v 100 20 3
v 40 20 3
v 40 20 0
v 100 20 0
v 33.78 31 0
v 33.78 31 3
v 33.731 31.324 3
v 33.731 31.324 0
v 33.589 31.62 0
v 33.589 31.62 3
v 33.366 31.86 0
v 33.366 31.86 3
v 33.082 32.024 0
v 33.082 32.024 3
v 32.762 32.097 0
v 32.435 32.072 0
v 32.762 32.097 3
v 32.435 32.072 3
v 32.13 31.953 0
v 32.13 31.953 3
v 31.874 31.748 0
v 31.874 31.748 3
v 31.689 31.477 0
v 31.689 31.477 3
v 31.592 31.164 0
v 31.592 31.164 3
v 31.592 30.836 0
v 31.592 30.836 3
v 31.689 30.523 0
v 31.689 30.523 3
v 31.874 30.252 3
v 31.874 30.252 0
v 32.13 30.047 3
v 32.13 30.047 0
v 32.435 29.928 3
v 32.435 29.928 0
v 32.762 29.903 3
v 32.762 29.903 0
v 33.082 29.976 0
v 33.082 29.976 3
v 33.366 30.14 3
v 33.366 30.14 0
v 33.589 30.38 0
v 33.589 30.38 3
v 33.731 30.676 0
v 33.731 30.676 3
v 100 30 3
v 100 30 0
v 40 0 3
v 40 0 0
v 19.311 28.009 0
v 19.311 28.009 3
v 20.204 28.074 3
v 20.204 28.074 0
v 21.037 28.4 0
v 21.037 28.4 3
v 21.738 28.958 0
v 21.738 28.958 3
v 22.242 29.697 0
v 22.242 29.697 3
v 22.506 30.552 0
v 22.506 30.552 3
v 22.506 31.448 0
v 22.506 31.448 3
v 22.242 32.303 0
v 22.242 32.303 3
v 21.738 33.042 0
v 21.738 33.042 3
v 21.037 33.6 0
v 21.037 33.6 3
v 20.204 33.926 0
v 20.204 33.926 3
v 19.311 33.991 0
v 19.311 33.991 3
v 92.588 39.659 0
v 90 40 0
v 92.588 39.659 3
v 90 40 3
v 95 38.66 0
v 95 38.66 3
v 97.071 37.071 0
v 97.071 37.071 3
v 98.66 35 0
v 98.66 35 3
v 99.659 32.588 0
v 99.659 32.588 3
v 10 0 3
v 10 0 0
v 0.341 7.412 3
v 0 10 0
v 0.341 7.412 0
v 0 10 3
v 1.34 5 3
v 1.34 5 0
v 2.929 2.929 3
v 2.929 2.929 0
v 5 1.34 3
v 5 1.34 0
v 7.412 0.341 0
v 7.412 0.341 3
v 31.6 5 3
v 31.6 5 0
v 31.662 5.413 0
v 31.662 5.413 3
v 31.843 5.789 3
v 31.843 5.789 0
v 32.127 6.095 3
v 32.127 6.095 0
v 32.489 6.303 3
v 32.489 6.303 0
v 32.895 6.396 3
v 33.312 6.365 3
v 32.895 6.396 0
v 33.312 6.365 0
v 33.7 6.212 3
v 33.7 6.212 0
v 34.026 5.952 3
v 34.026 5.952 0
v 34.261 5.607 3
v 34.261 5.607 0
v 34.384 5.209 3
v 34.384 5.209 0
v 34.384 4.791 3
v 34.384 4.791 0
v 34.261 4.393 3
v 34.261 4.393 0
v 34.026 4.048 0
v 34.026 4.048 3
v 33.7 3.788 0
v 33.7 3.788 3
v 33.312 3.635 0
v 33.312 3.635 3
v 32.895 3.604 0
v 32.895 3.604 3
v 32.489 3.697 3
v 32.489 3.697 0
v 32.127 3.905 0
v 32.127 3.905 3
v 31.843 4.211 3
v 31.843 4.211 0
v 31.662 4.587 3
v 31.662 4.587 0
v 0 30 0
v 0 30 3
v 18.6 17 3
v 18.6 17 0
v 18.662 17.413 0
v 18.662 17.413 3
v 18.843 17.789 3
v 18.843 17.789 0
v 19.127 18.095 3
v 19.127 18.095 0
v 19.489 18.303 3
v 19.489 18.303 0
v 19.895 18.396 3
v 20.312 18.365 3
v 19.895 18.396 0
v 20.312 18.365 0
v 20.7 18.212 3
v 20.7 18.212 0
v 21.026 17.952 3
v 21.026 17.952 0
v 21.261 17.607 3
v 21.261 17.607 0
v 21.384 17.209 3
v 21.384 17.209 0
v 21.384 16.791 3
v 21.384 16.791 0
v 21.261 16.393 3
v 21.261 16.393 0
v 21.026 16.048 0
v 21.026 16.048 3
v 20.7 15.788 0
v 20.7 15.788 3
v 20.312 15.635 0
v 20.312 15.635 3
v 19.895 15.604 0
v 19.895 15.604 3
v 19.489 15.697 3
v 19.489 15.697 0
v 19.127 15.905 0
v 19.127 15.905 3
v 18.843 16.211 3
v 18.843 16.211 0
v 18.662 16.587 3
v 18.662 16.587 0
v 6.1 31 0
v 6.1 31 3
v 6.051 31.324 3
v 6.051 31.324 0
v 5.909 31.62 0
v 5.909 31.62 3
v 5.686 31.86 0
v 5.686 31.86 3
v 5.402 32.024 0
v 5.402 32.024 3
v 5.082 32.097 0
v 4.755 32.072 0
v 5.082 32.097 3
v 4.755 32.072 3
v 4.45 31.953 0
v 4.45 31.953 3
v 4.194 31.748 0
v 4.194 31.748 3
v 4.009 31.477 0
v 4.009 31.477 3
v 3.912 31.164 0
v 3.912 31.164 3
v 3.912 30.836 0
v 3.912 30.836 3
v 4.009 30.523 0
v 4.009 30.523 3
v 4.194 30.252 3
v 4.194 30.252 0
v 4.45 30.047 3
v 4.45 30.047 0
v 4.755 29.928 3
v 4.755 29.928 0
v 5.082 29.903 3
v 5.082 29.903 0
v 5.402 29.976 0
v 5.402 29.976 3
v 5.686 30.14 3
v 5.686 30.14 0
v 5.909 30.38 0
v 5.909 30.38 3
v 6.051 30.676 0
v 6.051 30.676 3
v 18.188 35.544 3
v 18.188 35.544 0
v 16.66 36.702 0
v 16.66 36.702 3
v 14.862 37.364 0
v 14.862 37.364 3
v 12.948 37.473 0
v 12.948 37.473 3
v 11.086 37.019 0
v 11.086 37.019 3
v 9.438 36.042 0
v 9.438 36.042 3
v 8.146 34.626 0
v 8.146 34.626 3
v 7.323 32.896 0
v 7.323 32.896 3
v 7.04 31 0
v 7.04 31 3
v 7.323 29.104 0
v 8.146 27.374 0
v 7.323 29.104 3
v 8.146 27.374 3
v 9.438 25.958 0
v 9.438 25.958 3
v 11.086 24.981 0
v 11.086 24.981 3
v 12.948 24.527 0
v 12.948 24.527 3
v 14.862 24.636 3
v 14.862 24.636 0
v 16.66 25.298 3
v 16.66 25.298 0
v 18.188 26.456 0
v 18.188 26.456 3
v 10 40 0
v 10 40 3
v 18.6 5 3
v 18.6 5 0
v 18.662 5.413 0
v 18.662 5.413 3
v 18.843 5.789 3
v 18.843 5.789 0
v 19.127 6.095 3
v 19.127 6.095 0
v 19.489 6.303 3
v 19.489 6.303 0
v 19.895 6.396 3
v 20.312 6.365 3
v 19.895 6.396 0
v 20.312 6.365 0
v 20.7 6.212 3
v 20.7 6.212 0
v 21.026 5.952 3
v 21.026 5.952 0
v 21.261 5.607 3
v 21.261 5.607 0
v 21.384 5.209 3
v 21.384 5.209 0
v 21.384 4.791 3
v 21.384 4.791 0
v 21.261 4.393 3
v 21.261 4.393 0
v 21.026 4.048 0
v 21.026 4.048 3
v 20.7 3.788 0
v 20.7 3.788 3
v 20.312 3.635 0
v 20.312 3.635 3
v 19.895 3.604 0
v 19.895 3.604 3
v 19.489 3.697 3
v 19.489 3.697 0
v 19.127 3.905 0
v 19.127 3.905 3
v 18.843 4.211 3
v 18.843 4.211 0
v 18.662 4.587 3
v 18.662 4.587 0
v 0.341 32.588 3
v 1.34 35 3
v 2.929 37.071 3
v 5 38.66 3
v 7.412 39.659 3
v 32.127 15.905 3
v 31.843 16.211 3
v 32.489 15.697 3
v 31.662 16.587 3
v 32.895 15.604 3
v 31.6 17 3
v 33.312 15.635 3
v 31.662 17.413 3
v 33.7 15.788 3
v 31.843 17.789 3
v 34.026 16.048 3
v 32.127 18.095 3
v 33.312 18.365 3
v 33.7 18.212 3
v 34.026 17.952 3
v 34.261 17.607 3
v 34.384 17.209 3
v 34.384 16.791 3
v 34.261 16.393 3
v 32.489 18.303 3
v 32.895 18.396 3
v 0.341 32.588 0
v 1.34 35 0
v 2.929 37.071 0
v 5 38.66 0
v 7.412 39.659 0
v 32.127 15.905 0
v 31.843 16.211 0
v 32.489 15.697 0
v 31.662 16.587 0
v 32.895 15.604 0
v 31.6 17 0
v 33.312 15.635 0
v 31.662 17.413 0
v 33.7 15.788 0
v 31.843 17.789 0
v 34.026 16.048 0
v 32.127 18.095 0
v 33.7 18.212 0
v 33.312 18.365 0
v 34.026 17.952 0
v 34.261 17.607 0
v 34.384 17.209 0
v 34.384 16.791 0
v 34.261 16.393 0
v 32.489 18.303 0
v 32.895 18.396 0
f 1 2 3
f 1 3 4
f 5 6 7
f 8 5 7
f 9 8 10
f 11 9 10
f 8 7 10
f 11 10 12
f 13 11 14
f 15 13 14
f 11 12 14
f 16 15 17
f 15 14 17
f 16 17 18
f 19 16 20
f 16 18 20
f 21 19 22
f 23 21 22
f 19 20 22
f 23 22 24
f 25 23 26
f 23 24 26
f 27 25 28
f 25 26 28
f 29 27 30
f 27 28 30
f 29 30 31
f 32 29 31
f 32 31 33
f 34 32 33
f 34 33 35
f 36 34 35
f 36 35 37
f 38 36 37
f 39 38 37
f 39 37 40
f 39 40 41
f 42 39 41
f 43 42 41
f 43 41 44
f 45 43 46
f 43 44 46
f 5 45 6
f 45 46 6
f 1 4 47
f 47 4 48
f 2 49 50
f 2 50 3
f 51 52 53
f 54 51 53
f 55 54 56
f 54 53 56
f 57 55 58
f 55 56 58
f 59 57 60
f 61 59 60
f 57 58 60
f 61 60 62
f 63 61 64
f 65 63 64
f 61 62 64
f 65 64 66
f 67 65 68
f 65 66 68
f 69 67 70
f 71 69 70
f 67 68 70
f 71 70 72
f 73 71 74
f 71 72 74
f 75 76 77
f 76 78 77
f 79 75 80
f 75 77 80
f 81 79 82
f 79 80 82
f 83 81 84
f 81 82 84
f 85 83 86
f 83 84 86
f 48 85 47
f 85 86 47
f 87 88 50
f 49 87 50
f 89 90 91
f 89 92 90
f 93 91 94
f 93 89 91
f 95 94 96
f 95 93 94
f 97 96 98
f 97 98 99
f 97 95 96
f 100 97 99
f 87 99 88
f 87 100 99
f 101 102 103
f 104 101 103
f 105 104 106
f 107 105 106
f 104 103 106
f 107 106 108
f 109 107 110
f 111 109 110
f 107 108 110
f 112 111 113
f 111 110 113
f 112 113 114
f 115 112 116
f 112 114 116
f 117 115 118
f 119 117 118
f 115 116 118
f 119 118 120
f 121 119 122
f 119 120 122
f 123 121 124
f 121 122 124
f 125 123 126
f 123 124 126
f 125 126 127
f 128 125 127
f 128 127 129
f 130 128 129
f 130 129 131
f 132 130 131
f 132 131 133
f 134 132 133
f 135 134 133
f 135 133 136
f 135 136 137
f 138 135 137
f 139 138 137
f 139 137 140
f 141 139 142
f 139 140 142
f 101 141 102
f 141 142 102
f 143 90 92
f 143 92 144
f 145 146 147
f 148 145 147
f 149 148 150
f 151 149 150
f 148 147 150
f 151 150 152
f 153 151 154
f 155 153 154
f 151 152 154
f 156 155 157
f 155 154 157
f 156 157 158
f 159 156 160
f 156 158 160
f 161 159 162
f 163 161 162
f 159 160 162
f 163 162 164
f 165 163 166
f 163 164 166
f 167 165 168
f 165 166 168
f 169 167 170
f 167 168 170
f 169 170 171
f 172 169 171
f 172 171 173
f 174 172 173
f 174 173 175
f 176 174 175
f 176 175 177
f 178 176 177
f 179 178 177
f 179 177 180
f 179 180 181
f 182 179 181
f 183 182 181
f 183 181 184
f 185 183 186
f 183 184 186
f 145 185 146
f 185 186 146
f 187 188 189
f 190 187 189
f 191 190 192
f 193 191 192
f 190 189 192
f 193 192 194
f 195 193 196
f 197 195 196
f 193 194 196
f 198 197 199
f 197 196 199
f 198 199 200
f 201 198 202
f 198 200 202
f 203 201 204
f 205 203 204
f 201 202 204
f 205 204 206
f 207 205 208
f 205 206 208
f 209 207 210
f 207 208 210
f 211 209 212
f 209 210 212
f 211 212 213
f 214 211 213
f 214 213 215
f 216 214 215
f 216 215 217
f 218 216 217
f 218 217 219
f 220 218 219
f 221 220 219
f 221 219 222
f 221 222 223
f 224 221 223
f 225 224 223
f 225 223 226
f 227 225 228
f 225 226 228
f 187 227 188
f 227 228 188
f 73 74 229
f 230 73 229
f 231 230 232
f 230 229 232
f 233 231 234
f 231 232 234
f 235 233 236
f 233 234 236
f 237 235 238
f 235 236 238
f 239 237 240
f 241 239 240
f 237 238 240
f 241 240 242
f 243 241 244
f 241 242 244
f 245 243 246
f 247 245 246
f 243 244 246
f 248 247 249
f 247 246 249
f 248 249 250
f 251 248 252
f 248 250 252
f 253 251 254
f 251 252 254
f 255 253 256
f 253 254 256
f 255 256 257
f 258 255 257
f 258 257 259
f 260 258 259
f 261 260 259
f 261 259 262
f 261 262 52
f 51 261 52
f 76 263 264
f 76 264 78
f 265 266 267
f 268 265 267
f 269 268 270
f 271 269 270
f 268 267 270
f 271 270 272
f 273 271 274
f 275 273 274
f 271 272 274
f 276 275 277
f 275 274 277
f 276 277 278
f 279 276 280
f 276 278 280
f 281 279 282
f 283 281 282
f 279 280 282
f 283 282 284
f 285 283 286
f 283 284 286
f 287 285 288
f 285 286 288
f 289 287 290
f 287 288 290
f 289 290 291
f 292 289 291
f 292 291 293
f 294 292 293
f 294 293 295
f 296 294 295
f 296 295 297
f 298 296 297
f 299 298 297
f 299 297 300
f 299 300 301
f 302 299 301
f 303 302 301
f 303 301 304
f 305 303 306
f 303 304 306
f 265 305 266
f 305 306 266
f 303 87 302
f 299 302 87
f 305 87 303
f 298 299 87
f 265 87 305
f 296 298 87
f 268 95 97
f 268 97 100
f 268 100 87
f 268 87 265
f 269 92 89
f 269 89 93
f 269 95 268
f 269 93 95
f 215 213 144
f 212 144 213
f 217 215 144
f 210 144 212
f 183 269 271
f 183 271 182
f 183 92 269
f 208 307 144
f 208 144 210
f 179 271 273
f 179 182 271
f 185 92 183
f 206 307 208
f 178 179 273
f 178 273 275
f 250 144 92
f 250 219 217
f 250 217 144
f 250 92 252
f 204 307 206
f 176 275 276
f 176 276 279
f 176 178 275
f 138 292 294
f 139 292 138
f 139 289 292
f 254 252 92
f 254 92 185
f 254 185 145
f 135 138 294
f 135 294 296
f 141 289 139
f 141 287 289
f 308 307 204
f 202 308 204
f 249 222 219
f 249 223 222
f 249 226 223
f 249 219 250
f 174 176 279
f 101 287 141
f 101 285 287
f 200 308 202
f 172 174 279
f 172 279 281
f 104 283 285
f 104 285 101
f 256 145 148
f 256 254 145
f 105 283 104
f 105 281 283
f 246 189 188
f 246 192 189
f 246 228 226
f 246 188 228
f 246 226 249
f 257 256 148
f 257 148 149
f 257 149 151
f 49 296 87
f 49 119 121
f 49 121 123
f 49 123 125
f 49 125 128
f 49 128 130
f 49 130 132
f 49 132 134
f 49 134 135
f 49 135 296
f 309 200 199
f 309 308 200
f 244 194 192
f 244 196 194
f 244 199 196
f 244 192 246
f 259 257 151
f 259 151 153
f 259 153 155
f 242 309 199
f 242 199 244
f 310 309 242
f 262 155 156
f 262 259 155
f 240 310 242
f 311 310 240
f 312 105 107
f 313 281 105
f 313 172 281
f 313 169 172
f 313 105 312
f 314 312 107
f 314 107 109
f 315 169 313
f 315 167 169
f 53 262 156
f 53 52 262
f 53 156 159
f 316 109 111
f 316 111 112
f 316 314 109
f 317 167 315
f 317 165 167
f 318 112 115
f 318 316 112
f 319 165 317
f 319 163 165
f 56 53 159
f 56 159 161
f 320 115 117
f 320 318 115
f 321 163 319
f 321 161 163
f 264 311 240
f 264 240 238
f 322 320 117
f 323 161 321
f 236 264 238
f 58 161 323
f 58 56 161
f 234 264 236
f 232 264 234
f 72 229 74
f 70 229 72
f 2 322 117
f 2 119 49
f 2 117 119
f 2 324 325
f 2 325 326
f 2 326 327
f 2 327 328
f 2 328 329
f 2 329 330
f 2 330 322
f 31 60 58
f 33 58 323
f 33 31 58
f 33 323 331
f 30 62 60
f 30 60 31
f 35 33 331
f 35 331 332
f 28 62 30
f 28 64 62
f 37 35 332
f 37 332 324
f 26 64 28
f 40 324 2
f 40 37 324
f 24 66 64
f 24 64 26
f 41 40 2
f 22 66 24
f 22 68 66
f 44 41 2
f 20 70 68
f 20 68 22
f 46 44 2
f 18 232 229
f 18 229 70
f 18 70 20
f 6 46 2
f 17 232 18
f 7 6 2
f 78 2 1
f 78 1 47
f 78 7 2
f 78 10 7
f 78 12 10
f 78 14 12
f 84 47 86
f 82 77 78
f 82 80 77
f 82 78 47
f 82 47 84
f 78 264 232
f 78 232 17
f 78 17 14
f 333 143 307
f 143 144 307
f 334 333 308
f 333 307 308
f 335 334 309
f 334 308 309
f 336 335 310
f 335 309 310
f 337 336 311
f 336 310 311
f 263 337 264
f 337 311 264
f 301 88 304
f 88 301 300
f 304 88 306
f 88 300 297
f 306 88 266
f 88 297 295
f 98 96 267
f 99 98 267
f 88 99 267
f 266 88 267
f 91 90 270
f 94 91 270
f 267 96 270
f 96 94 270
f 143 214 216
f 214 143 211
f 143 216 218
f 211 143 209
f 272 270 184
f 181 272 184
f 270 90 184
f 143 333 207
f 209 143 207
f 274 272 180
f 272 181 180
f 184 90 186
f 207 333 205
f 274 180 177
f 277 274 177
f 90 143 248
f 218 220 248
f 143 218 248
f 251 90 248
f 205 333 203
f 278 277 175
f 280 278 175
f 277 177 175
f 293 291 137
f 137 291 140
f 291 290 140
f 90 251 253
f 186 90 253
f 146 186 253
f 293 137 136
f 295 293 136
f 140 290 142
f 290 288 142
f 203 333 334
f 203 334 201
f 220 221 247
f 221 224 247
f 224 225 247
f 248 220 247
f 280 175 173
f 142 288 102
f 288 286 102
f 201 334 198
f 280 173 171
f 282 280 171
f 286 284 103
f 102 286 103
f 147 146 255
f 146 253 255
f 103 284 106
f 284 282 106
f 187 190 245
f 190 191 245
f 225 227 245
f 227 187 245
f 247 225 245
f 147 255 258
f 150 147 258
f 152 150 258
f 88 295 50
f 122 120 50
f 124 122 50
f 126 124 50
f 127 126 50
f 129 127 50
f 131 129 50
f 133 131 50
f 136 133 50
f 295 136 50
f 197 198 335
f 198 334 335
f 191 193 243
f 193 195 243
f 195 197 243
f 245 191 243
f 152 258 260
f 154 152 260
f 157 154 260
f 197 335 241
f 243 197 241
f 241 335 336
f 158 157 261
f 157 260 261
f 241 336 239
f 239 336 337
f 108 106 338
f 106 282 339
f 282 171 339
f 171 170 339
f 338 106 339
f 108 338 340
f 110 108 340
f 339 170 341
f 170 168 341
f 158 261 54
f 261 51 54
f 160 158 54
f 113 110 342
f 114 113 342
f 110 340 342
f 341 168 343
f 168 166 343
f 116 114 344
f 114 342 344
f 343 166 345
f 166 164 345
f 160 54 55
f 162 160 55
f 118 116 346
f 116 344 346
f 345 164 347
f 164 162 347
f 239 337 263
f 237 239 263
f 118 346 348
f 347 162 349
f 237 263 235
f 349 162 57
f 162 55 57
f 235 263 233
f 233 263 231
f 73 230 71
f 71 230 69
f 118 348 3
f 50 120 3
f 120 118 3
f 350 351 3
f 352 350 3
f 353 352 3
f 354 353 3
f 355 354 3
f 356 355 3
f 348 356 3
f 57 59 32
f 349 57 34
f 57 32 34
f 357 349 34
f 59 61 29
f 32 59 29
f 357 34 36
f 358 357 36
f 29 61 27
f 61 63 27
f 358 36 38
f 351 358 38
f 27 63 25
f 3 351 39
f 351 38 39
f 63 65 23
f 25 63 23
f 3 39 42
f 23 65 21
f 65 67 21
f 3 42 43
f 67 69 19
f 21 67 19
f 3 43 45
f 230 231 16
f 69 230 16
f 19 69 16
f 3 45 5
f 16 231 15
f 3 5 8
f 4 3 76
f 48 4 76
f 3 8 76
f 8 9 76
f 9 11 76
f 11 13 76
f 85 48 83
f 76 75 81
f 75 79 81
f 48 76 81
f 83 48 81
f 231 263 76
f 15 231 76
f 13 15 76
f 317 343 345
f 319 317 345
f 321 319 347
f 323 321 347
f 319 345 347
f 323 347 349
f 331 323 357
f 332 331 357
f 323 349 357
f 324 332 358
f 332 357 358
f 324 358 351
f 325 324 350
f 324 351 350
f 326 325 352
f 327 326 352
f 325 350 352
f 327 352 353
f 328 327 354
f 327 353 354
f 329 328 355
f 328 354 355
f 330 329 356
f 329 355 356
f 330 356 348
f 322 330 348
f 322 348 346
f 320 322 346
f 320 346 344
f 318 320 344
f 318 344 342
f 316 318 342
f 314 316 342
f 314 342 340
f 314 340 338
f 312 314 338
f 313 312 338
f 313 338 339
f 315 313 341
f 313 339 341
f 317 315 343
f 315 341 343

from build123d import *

# Parameters (mm, degrees)
SKETCH_1_W          = 100
SKETCH_1_H          = 40
EXTRUDE_1_DEPTH     = 3
SKETCH_6_R          = 1.4
CUT_EXTRUDE_4_DEPTH = 3
SKETCH_7_W          = 60
SKETCH_7_H          = 20
CUT_EXTRUDE_5_DEPTH = 3
SKETCH_8_R          = 3
SKETCH_8_R_2        = 6.5
SKETCH_8_R_3        = 1.1
CUT_EXTRUDE_6_DEPTH = 3
FILLET_1_R          = 10


with BuildPart() as part:
    # 草图1 → 凸台-拉伸1 (new body)
    with BuildSketch(Plane.XY):
        with Locations((50, 20)):
            Rectangle(SKETCH_1_W, SKETCH_1_H)
    extrude(amount=EXTRUDE_1_DEPTH)

    # 草图6 → 切除-拉伸4 (cut)
    with BuildSketch(Plane(origin=(0, 0, 0), x_dir=(-1, 0, 0), z_dir=(0, 0, -1))):
        with Locations((-20, 5)):
            Circle(SKETCH_6_R)
        with Locations((-20, 17)):
            Circle(SKETCH_6_R)
        with Locations((-33, 17)):
            Circle(SKETCH_6_R)
        with Locations((-33, 5)):
            Circle(SKETCH_6_R)
    extrude(amount=-CUT_EXTRUDE_4_DEPTH, mode=Mode.SUBTRACT)

    # 草图7 → 切除-拉伸5 (cut)
    with BuildSketch(Plane.XY.offset(3)):
        with Locations((70, 10)):
            Rectangle(SKETCH_7_W, SKETCH_7_H)
    extrude(amount=-CUT_EXTRUDE_5_DEPTH, mode=Mode.SUBTRACT)

    # 草图8 → 切除-拉伸6 (cut)
    with BuildSketch(Plane.XY.offset(3)):
        with Locations((19.54, 31)):
            Circle(SKETCH_8_R)
        with Locations((13.54, 31)):
            Circle(SKETCH_8_R_2)
        with Locations((5, 31)):
            Circle(SKETCH_8_R_3)
        with Locations((32.68, 31)):
            Circle(SKETCH_8_R_3)
    extrude(amount=-CUT_EXTRUDE_6_DEPTH, mode=Mode.SUBTRACT)

    # 圆角1
    fillet_1_edges = [part.edges().sort_by_distance(p)[0] for p in [
        (0, 40, 1.5),
        (100, 40, 1.5),
        (0, 0, 1.5),
    ]]
    fillet(fillet_1_edges, radius=FILLET_1_R)


solid = part.part
